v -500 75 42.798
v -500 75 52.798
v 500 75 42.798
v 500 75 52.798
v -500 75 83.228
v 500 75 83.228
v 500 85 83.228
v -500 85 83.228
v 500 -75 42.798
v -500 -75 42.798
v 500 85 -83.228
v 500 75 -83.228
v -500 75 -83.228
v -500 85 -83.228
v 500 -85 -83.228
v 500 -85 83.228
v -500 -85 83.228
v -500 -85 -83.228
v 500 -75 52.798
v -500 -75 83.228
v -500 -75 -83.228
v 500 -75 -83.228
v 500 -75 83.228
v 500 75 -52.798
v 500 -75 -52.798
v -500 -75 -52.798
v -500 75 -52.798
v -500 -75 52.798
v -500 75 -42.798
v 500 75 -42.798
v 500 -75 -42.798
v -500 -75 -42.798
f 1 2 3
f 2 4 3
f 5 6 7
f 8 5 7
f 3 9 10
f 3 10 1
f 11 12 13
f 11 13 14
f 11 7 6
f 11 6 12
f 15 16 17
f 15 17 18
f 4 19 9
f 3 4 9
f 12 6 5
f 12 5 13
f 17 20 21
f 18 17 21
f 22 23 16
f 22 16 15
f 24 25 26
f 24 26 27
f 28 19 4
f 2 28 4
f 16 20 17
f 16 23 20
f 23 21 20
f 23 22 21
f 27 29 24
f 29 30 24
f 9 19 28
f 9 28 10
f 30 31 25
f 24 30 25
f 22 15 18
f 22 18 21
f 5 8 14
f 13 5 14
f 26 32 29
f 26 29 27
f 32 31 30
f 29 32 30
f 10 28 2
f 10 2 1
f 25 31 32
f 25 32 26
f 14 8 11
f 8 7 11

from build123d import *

# Parameters (mm, degrees)
SKETCH_1_W        = 166.456
SKETCH_1_H        = 10
EXTRUDE_1_DEPTH   = 500
EXTRUDE_1_2_DEPTH = 500
SKETCH_1_3_W      = 10
SKETCH_1_3_H      = 150
EXTRUDE_2_DEPTH   = 500
EXTRUDE_2_2_DEPTH = 500


with BuildPart() as part:
    # 草图1 → 凸台-拉伸1 (new, symmetric)
    with BuildSketch(Plane(origin=(0, 0, 0), x_dir=(0, 0, -1), z_dir=(1, 0, 0))):
        with Locations((0, 80)):
            Rectangle(SKETCH_1_W, SKETCH_1_H)
    extrude(amount=EXTRUDE_1_DEPTH, both=True)


with BuildPart() as body_2:
    # 草图1 → Extrude 1 2 (new, symmetric)
    with BuildSketch(Plane(origin=(0, 0, 0), x_dir=(0, 0, -1), z_dir=(1, 0, 0))):
        with Locations((0, -80)):
            Rectangle(SKETCH_1_W, SKETCH_1_H)
    extrude(amount=EXTRUDE_1_2_DEPTH, both=True)


with BuildPart() as body_3:
    # 草图1<3> → 凸台-拉伸2 (new, symmetric)
    with BuildSketch(Plane(origin=(0, 0, 0), x_dir=(0, 0, -1), z_dir=(1, 0, 0))):
        with Locations((-47.7975, 0)):
            Rectangle(SKETCH_1_3_W, SKETCH_1_3_H)
    extrude(amount=EXTRUDE_2_DEPTH, both=True)


with BuildPart() as body_4:
    # 草图1<3> → Extrude 2 2 (new, symmetric)
    with BuildSketch(Plane(origin=(0, 0, 0), x_dir=(0, 0, -1), z_dir=(1, 0, 0))):
        with Locations((47.7975, 0)):
            Rectangle(SKETCH_1_3_W, SKETCH_1_3_H)
    extrude(amount=EXTRUDE_2_2_DEPTH, both=True)


solid = Compound([part.part, body_2.part, body_3.part, body_4.part])
